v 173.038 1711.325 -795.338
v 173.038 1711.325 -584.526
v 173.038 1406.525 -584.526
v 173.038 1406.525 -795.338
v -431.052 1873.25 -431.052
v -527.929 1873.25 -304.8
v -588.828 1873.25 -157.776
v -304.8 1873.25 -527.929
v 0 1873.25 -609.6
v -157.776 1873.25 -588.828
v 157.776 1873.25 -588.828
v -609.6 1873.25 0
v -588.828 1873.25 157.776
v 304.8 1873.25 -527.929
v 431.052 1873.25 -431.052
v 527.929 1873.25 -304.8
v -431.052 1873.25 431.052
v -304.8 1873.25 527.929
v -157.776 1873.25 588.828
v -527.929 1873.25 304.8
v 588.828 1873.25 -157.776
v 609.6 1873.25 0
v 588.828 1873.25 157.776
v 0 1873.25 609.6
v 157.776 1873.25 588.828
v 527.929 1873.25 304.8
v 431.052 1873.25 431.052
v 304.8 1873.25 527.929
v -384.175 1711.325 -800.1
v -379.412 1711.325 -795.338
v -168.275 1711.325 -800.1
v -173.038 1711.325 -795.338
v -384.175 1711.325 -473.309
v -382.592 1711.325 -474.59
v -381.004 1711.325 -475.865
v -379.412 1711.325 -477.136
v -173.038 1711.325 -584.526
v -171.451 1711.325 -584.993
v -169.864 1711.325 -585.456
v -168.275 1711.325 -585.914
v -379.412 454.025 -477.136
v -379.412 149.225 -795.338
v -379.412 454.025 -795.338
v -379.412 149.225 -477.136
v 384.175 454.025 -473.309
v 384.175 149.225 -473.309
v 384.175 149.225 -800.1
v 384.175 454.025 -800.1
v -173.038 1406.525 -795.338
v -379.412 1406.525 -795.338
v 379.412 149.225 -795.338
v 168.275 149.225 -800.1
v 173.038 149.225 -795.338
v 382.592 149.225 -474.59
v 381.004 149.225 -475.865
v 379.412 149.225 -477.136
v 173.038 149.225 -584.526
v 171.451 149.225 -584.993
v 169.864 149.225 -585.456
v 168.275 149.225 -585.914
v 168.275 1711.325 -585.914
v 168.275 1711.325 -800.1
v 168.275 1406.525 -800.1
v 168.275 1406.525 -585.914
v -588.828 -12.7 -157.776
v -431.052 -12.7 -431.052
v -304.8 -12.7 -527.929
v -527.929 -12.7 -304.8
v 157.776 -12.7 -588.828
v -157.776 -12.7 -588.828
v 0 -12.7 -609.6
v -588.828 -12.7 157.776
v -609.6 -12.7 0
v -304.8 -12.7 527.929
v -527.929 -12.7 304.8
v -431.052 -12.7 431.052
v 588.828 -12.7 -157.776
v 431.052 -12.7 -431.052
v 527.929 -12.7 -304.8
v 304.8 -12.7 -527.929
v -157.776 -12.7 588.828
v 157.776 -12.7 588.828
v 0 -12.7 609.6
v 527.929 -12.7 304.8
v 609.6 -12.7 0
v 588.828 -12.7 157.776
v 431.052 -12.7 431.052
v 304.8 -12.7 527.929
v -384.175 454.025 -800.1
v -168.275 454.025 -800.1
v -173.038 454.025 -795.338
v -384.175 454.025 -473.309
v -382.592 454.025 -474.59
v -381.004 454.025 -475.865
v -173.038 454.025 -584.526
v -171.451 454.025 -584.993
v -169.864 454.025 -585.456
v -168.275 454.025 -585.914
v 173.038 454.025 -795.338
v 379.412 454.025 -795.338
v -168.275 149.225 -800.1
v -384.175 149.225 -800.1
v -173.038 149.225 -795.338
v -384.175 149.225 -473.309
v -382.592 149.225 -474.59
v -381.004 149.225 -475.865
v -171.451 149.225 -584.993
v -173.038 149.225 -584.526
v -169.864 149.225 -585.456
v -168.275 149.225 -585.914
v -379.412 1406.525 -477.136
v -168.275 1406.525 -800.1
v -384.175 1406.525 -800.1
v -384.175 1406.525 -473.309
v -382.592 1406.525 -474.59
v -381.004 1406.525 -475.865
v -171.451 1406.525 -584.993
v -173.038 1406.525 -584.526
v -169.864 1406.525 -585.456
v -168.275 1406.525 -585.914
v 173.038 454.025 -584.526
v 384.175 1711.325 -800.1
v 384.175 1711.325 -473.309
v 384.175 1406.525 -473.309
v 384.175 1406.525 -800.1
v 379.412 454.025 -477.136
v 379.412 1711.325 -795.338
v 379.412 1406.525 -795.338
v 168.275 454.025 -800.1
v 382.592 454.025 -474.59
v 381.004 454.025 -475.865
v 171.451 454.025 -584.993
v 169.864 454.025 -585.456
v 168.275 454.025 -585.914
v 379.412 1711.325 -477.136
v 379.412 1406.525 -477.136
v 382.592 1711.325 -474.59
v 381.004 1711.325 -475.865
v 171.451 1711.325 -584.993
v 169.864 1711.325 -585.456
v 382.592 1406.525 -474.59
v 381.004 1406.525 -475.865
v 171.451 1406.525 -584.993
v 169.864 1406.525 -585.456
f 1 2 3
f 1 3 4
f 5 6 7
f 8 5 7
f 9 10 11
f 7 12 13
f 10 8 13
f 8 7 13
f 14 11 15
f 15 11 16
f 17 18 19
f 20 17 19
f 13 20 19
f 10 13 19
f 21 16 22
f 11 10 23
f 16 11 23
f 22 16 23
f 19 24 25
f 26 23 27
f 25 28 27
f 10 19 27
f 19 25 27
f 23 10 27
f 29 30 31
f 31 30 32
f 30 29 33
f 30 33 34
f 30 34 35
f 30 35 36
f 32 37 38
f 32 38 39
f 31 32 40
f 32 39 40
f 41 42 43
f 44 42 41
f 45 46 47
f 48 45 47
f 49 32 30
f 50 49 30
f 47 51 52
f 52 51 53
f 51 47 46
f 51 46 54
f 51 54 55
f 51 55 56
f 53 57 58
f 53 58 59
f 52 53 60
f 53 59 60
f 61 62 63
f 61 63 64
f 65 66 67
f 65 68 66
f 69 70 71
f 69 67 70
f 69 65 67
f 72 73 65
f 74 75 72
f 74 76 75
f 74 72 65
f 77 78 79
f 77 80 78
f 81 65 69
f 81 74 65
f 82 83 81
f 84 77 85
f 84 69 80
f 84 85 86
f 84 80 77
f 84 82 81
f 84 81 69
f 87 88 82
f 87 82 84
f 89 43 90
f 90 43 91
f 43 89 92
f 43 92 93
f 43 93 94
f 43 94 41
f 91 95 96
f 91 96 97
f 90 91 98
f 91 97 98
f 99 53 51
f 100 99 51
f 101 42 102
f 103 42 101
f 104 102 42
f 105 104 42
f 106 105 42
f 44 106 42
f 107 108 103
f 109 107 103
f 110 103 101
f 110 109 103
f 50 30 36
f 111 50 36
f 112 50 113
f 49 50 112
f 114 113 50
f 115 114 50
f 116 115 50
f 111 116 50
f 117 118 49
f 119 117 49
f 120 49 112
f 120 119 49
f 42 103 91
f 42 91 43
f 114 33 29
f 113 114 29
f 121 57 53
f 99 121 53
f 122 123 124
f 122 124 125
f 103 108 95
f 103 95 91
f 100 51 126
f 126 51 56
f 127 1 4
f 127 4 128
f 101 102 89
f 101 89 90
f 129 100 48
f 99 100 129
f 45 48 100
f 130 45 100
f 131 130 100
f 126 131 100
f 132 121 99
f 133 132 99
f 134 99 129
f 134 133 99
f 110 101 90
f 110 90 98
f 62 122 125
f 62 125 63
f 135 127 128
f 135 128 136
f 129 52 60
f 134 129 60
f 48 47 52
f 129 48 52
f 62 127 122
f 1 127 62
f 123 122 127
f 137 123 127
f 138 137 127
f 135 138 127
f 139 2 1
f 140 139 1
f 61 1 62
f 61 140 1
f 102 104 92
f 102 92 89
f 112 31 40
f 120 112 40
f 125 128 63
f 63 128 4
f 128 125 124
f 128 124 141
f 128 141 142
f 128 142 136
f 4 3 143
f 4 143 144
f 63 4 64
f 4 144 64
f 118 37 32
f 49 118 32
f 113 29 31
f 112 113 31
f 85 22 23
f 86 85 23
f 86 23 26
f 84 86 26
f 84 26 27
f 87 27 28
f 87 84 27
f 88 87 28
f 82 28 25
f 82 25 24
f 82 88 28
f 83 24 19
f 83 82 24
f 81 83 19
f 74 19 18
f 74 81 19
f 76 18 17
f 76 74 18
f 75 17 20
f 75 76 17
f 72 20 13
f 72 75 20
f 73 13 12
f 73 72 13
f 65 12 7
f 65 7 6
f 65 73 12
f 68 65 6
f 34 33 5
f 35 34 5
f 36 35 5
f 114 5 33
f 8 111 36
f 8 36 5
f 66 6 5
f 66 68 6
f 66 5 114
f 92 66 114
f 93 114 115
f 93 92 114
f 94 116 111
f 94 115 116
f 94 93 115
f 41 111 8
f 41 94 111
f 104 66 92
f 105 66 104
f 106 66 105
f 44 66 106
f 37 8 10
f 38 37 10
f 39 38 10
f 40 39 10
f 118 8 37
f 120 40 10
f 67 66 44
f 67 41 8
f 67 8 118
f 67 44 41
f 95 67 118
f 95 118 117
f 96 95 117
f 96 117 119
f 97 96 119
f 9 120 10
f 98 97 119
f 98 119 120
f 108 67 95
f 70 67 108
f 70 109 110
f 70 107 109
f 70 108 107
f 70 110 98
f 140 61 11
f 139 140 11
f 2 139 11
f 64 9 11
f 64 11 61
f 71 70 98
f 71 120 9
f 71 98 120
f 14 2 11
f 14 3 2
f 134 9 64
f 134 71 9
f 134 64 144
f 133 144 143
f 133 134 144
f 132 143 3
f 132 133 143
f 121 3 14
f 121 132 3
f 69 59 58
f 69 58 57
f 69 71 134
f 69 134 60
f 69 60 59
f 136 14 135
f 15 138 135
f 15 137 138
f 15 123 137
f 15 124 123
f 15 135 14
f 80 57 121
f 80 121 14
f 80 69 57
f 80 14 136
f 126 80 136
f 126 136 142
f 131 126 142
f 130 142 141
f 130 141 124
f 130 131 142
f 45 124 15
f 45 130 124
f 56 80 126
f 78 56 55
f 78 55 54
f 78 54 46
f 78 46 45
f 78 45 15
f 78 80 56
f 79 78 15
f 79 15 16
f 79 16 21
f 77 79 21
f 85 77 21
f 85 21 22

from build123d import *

# Parameters (mm, degrees)
F0_R     = 609.6
F1_DEPTH = 1873.25
F4_DEPTH = 304.8


# Not quite as in the source:
# - a feature of the source that left no trace in its solid (it failed there, or was rolled back) is left out
# - a pattern or mirror of a feature is missing from the dataset's text; its kind, count and spacing are read off the source's solid


with BuildPart() as f1:
    # F0 (on Front) → F1 (new body)
    with BuildSketch(Plane.XZ):
        Circle(F0_R)
    extrude(amount=-F1_DEPTH)

    # F1_copies: F1 across plane


with BuildPart() as f1_1:
    add(f1.part)
    add(f1.part.mirror(Plane(origin=(0, 930.275, 0), x_dir=(0, 0, -1), z_dir=(0, -1, 0))))

    # F3 (on offset) → F4 (join)
    with BuildSketch(Plane.XZ.offset(-149.225)):
        with BuildLine():
            Line((-384.175, -473.3093379334), (-384.175, -800.1))
            Line((-384.175, -800.1), (-168.275, -800.1))
            Line((-168.275, -800.1), (-168.275, -585.9144002113))
            ThreePointArc((-168.275, -585.9144002113), (-170.6576627394, -585.2248475145), (-173.0375, -584.5256055929))
            Line((-173.0375, -584.5256055929), (-173.0375, -795.3375))
            Line((-173.0375, -795.3375), (-379.4125, -795.3375))
            Line((-379.4125, -795.3375), (-379.4125, -477.1355308964))
            ThreePointArc((-379.4125, -477.1355308964), (-381.7985430528, -475.2284003748), (-384.175, -473.3093379334))
        make_face()
    f4 = extrude(amount=-F4_DEPTH)

    # F4_copies: F4 across plane
    add(f4.mirror(Plane.ZX.offset(930.275)))

    # F5: F1 across plane


with BuildPart() as f1_2:
    add(f1_1.part)
    add(f1_1.part.mirror(Plane.YZ))


solid = f1_2.part
